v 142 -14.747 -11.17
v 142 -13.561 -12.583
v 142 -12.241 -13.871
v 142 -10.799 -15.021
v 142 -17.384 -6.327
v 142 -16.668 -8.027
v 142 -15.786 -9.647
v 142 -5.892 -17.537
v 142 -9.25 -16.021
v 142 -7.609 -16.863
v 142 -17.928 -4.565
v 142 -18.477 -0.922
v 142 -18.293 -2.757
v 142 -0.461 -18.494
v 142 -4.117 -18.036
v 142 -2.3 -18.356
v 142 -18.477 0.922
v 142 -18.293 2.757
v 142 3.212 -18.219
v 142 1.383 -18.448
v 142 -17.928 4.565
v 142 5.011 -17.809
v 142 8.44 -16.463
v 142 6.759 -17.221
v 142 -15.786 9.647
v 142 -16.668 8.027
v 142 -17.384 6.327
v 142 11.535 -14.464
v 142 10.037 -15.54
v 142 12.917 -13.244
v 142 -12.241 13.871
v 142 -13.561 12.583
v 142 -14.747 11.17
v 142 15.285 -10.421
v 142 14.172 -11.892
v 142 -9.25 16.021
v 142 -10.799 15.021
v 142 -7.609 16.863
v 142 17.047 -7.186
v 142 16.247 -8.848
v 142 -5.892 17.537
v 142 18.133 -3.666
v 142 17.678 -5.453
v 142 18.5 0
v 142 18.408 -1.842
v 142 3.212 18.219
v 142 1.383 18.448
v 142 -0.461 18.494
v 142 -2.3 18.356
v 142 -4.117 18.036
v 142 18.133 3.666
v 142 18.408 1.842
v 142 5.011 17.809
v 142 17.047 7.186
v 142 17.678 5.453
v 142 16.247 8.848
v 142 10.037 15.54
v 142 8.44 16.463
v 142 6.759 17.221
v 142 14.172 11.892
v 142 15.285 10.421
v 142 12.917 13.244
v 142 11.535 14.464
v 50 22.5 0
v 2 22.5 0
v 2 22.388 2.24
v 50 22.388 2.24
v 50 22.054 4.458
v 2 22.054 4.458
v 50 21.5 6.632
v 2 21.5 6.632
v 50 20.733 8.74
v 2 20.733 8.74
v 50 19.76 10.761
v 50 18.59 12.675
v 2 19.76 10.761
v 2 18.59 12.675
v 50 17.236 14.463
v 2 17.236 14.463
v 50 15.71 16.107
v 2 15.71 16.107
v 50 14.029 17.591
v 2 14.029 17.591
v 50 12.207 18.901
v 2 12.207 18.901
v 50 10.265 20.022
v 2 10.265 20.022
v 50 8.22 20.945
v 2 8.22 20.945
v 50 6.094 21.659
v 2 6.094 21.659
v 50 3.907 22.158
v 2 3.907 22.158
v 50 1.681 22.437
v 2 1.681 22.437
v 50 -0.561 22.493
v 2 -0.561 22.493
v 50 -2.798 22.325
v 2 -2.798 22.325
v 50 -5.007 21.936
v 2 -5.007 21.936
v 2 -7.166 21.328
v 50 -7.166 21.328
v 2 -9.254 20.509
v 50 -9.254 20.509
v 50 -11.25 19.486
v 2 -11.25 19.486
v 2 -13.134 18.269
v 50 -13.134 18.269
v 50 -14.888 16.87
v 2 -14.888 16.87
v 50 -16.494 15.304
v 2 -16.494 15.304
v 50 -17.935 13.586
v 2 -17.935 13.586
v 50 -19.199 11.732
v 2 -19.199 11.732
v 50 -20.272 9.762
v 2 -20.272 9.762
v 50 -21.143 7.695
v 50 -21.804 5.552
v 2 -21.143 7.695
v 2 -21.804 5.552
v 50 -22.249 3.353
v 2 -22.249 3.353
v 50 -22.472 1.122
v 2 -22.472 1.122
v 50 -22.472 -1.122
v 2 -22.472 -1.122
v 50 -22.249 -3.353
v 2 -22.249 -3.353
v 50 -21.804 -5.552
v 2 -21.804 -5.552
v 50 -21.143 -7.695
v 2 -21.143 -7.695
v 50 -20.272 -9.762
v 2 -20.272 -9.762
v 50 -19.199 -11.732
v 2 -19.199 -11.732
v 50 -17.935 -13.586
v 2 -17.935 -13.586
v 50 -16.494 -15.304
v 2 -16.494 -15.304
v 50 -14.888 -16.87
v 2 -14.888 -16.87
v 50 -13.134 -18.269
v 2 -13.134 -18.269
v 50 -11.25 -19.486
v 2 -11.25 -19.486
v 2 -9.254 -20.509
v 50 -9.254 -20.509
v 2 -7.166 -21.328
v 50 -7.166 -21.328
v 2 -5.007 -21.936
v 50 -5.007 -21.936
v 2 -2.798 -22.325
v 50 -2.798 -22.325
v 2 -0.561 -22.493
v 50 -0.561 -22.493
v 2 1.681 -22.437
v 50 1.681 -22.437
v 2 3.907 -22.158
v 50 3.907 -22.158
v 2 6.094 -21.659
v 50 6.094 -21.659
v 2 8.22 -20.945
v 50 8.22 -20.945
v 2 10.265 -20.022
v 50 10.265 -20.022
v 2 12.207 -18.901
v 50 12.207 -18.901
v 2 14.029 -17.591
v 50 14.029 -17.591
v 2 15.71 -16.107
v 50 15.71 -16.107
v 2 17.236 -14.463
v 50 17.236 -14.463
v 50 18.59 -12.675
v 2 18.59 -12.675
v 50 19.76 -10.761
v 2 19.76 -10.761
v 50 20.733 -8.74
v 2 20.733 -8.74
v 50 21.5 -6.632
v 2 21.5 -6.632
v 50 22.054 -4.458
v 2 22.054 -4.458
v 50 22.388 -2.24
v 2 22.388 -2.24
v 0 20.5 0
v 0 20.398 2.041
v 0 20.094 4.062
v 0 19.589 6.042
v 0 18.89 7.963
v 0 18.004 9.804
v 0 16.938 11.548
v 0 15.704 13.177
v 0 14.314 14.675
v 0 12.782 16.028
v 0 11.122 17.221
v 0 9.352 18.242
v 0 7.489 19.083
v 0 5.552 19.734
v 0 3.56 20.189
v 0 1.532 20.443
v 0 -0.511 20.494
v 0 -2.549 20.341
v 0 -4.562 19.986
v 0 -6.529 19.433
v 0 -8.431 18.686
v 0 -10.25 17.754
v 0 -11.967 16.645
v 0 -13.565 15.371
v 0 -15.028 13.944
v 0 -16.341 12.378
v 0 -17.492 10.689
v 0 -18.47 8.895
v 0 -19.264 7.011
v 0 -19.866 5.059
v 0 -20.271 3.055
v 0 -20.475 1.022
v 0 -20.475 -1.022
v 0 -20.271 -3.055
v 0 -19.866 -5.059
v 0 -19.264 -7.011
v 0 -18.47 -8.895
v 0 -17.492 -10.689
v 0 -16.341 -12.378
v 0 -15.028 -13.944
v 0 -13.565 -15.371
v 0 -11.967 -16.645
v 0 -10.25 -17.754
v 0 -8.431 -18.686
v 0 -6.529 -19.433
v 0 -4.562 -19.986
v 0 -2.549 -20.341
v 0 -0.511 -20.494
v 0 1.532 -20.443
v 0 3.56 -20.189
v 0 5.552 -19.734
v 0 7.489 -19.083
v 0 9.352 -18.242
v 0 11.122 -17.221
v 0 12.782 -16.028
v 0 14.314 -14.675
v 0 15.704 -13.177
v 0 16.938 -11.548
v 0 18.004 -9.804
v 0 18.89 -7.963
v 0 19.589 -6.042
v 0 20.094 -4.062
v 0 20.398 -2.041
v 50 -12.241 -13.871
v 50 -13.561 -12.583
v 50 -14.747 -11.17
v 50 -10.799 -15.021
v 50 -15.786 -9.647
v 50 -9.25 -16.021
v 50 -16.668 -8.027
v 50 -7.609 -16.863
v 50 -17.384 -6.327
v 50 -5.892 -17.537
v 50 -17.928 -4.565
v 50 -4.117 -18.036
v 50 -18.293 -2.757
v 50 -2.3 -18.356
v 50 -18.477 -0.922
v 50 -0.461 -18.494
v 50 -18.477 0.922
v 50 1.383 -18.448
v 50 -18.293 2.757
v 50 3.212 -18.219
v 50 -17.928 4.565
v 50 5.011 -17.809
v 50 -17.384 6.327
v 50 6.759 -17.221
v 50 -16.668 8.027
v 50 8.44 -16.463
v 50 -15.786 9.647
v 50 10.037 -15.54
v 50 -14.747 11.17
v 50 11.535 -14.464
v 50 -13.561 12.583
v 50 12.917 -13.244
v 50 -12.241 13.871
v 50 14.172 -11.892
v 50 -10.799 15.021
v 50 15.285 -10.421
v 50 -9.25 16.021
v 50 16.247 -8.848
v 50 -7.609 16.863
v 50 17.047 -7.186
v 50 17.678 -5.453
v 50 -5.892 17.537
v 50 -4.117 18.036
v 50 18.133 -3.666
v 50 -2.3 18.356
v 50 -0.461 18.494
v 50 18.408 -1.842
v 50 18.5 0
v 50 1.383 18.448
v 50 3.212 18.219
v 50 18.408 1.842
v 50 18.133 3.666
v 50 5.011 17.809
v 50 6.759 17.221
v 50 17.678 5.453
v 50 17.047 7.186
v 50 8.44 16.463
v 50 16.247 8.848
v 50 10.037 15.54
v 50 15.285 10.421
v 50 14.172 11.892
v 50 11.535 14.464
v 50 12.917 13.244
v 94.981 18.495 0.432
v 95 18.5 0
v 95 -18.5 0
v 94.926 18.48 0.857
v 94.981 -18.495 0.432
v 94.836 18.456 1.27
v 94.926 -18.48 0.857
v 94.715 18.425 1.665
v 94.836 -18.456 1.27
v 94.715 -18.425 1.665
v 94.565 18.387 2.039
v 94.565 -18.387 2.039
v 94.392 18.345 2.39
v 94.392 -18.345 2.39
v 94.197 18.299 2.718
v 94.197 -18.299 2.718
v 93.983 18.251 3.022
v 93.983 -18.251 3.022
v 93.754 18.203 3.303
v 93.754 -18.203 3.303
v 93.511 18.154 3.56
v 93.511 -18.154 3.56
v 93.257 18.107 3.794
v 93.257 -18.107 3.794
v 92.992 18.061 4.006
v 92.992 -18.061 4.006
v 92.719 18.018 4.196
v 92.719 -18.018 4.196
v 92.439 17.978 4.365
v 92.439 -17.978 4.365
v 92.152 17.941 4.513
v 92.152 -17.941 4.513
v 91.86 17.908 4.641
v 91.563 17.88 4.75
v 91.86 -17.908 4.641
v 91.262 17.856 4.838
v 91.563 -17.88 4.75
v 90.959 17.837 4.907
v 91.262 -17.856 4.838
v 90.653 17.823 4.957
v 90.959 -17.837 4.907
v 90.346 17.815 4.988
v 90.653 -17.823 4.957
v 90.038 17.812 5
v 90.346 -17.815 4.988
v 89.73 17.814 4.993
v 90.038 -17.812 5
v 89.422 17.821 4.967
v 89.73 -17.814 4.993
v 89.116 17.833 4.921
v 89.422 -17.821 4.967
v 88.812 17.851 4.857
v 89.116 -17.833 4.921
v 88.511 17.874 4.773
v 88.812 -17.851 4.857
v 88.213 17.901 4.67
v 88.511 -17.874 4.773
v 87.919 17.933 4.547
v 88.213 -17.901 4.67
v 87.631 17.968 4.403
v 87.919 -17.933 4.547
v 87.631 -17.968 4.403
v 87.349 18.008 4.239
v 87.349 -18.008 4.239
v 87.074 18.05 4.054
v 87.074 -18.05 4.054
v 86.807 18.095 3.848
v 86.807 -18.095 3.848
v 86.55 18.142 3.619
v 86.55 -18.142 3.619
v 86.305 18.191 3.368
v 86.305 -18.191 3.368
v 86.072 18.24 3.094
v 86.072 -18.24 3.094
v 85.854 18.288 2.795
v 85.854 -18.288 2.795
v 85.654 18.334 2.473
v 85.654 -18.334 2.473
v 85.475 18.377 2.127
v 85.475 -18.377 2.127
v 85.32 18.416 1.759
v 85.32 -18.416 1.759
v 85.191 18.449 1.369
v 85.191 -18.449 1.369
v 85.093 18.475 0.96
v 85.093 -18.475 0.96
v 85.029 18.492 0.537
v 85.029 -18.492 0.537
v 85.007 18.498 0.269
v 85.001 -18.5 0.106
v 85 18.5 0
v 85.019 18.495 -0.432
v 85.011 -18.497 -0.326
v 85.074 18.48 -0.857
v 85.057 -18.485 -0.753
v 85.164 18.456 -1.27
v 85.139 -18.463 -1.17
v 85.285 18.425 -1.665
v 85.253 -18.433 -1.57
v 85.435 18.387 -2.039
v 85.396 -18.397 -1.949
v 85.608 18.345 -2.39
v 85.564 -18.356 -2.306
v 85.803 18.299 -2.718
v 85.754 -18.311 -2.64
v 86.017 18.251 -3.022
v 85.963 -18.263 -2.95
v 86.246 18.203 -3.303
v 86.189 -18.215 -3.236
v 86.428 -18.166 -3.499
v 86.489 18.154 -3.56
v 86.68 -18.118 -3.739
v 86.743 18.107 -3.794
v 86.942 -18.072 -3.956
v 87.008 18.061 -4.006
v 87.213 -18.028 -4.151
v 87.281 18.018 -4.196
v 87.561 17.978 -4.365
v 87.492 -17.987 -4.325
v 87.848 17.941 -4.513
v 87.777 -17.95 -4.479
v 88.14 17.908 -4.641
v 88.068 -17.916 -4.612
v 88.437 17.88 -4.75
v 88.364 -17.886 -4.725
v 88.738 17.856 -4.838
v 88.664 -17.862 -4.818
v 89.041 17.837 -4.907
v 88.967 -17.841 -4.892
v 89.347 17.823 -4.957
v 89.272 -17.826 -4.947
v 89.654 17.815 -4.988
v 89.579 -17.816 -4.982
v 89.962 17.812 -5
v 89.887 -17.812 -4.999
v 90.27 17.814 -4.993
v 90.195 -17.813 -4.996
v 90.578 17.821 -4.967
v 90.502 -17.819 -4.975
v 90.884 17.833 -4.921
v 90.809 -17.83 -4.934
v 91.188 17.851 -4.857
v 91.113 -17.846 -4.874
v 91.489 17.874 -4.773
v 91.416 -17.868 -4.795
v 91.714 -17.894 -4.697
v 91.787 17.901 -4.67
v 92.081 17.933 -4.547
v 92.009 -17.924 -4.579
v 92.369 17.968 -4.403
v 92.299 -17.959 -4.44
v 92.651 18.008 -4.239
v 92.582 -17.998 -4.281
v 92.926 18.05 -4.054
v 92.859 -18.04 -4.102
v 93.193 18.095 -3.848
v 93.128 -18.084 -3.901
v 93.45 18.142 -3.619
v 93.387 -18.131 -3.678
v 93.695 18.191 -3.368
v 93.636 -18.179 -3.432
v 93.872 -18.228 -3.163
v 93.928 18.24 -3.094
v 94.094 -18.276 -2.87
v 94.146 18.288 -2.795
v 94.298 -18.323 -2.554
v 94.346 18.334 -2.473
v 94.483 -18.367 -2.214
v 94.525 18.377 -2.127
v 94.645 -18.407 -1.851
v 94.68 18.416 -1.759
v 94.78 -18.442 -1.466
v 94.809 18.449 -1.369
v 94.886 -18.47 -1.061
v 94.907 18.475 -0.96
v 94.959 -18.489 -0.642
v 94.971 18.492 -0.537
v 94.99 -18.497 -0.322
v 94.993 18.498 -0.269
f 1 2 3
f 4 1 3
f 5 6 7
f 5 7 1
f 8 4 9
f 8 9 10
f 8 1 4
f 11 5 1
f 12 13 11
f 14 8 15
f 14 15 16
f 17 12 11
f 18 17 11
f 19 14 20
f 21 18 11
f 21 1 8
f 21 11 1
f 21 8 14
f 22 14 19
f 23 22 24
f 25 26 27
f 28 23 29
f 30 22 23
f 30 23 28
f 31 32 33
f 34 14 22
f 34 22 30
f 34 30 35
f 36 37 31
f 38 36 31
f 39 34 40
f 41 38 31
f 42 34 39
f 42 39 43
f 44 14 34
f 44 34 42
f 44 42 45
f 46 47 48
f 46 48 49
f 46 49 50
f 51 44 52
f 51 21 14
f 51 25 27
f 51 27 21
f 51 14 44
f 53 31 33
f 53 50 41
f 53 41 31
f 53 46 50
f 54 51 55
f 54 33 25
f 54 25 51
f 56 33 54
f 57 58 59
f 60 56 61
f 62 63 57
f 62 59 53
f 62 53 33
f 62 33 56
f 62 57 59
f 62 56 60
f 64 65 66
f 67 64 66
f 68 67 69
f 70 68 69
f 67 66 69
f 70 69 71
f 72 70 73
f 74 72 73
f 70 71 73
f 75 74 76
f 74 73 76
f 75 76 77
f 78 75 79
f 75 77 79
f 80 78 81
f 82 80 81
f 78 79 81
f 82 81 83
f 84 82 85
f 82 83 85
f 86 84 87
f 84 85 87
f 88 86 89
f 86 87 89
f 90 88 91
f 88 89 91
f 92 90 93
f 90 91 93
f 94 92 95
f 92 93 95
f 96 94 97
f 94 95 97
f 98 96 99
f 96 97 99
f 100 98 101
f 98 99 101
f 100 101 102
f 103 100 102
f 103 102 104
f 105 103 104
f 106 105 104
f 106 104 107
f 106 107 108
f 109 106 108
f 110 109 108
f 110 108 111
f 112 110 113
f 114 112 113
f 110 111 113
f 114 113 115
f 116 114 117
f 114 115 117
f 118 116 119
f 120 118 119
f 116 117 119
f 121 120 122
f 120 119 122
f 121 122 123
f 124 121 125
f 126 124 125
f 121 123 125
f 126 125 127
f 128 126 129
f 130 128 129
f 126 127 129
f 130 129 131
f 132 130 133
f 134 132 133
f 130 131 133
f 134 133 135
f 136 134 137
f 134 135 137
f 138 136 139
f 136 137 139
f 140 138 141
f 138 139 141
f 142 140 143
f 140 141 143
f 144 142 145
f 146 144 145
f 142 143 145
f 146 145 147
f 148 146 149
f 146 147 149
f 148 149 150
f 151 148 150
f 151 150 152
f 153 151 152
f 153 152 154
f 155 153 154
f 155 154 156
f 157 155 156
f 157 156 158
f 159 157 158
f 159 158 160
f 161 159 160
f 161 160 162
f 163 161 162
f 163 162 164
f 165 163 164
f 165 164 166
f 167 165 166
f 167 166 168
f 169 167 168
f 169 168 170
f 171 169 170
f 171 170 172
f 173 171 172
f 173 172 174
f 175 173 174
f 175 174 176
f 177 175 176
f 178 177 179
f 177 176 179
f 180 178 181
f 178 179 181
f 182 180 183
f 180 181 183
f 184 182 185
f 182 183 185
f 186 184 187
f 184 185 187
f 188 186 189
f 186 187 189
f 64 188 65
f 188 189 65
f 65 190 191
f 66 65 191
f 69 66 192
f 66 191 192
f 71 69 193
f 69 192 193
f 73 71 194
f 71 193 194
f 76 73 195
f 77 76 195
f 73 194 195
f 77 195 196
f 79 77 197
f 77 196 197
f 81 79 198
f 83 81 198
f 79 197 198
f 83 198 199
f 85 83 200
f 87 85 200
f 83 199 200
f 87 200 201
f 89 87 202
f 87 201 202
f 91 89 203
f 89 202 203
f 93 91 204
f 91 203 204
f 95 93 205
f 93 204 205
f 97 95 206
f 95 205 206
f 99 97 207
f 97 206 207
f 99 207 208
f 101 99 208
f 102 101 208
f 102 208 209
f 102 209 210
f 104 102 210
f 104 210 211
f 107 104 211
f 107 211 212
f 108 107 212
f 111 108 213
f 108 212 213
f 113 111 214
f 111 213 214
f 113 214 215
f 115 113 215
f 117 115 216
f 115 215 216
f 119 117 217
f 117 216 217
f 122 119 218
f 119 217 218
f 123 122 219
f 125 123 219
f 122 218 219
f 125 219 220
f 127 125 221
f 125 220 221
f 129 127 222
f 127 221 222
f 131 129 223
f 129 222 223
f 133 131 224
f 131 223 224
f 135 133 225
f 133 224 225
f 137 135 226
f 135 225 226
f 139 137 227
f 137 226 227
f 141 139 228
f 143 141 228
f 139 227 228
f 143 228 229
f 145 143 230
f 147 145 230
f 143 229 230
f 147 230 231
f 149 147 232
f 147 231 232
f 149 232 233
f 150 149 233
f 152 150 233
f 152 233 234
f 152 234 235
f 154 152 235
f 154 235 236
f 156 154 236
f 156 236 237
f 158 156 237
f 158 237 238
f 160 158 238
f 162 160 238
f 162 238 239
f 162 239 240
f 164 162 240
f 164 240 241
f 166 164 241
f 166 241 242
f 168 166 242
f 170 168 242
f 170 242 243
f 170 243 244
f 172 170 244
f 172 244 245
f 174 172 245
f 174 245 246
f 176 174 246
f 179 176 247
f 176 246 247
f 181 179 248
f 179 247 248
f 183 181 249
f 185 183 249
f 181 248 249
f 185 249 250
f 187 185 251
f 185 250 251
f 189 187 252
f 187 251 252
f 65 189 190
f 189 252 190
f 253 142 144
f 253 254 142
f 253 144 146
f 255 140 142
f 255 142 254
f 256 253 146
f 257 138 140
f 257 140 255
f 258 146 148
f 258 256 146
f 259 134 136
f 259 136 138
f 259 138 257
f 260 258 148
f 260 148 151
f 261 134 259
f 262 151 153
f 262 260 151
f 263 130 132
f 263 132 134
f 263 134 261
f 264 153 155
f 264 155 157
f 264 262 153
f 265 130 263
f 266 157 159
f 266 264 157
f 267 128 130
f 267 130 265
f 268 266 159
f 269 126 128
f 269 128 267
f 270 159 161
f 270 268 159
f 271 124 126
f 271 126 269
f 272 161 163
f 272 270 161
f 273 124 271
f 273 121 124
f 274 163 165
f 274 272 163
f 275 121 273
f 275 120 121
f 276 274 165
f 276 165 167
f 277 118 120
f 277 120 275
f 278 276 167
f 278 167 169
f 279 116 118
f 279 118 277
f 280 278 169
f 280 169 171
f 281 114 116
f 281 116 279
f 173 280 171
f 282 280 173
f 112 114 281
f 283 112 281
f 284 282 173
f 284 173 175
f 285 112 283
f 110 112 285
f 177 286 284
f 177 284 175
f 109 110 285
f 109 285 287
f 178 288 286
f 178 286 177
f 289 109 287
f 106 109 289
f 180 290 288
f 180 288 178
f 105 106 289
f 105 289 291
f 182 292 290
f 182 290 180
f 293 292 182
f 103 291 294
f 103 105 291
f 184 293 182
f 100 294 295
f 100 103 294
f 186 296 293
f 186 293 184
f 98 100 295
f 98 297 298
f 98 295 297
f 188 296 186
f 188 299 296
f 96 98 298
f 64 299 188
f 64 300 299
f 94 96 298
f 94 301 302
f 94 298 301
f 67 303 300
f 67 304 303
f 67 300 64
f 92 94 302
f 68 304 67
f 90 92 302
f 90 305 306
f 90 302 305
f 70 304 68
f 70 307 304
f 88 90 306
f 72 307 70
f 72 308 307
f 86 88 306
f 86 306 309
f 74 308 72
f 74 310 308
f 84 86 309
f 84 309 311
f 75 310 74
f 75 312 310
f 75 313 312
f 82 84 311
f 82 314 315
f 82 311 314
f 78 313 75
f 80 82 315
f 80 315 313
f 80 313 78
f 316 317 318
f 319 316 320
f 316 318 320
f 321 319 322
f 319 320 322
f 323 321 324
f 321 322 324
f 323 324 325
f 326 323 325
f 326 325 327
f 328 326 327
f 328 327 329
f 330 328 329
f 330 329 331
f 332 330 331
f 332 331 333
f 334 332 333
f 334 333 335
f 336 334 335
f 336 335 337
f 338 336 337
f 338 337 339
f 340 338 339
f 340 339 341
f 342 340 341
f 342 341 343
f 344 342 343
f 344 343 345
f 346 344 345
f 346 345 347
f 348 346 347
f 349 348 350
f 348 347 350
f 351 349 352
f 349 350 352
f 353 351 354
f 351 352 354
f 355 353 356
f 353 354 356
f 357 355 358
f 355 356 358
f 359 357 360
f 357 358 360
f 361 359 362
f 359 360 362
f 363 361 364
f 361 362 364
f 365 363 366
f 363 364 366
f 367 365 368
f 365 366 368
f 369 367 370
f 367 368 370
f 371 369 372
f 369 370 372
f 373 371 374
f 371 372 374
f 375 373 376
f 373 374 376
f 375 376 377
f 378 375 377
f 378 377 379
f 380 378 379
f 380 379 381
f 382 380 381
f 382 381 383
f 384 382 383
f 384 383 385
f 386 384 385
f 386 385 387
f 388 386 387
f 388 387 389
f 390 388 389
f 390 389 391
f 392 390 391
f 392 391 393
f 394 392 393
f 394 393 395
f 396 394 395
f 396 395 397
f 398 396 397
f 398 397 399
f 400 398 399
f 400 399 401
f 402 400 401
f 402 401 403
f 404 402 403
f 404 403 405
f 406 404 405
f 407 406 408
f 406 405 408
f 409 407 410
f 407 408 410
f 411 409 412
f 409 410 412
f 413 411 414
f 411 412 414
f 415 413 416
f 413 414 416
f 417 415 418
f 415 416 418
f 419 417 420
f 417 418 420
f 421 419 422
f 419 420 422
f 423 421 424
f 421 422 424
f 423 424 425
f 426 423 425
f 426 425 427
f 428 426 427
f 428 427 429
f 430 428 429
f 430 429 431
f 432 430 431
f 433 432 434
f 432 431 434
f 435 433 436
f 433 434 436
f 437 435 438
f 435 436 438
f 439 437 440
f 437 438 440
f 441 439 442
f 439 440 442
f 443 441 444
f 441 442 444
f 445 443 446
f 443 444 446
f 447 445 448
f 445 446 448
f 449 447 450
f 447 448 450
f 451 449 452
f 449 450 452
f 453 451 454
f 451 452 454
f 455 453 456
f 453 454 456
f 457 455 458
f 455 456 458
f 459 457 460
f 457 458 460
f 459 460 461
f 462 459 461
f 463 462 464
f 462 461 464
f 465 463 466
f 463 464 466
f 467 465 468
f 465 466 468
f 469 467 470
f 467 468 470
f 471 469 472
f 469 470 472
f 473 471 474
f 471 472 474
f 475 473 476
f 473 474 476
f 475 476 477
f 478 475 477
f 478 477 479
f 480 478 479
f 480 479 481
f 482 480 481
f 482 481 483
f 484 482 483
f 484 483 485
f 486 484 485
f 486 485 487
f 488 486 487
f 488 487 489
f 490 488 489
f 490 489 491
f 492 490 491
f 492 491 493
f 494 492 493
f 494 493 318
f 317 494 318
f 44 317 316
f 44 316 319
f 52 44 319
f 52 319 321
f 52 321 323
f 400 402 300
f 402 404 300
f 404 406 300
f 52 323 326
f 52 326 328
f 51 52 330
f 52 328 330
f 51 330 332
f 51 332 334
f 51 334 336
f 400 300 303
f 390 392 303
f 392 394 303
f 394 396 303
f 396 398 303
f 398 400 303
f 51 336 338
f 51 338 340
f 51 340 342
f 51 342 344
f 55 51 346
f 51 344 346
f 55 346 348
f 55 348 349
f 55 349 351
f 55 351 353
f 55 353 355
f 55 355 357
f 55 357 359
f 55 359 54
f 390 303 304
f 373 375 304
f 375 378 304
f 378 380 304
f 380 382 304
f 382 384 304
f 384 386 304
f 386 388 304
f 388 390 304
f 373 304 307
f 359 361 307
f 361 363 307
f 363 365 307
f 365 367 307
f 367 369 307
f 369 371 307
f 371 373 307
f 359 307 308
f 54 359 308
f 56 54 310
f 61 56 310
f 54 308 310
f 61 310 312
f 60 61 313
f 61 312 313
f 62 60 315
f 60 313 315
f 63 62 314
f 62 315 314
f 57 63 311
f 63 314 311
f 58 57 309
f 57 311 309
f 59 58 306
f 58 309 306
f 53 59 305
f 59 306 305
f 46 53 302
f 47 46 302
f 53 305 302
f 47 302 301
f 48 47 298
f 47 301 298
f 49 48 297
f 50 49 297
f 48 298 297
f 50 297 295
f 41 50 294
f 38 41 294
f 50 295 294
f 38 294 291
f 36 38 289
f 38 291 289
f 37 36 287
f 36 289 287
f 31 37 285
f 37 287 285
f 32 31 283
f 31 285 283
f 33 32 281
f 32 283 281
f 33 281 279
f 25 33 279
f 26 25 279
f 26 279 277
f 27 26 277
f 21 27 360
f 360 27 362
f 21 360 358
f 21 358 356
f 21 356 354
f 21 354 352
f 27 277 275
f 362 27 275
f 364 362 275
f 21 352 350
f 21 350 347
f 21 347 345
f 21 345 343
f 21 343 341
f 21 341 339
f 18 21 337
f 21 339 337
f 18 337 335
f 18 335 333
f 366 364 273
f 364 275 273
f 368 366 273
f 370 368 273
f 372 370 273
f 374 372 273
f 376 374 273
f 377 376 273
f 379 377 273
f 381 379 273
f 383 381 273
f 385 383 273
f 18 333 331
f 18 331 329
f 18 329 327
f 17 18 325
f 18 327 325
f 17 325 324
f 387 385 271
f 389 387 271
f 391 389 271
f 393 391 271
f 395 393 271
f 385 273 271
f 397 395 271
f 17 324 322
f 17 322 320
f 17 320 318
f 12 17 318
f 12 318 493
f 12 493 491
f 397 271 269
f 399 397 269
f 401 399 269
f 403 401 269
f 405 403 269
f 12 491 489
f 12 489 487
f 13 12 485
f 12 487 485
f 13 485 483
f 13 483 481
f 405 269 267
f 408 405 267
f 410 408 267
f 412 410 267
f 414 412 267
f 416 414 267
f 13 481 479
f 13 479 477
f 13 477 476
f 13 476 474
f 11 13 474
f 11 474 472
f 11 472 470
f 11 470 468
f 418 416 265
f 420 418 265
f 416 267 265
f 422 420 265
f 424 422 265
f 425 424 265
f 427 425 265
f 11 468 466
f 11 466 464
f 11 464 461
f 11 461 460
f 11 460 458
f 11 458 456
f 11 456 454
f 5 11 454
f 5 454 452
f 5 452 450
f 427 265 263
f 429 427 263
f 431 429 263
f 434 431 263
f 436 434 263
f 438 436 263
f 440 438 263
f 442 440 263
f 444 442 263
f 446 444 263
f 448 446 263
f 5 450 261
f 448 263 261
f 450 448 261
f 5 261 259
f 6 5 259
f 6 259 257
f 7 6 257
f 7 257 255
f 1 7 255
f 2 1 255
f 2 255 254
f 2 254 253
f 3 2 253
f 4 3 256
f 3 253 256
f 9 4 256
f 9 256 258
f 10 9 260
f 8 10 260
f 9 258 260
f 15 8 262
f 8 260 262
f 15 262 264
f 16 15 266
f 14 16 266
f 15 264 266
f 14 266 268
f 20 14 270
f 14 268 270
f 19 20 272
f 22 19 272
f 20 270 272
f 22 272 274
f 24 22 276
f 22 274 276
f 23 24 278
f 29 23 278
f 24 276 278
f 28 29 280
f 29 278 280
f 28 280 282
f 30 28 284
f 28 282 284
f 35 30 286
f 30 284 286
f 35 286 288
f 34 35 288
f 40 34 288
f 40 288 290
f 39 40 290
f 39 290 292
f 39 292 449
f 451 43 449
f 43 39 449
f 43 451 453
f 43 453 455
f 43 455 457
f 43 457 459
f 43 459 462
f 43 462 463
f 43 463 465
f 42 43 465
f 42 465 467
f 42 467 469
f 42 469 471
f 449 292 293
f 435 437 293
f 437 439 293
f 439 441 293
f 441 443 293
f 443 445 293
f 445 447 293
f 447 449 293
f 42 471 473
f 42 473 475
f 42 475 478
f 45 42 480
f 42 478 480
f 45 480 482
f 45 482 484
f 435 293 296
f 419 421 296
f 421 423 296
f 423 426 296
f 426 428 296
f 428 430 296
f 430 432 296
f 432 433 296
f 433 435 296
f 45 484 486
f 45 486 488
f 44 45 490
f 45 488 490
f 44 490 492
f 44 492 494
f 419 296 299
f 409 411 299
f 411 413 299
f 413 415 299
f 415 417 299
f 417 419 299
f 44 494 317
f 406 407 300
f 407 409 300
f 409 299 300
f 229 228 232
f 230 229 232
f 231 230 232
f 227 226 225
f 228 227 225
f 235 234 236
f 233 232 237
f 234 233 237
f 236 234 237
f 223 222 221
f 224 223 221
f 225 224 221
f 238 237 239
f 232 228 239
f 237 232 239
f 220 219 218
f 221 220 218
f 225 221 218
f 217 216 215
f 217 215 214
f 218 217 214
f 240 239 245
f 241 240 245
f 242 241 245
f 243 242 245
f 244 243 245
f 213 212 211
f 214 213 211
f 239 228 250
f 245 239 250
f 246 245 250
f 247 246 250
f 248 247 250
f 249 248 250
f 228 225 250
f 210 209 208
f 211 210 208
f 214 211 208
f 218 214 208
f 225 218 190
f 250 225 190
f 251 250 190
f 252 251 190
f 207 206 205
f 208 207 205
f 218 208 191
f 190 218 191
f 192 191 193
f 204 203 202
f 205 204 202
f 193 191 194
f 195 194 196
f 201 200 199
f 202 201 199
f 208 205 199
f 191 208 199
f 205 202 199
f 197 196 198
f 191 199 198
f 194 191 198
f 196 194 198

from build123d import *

# Parameters (mm, degrees)
F0_R     = 18.5
F1_DEPTH = 142
F0_R_2   = 22.5
F2_DEPTH = 50
F3_R     = 5
F4_DEPTH = 25
F5_SIZE  = 2


with BuildPart() as f1:
    # F0 (on Right) → F1 (new body)
    with BuildSketch(Plane.YZ):
        Circle(F0_R)
    extrude(amount=F1_DEPTH)

    # F0 (on Right) → F2 (join)
    with BuildSketch(Plane.YZ):
        Circle(F0_R_2)
        Circle(F0_R, mode=Mode.SUBTRACT)
    extrude(amount=F2_DEPTH)

    # F3 (on Front) → F4 (cut, symmetric)
    with BuildSketch(Plane.XZ):
        with Locations((90, 0)):
            Circle(F3_R)
    extrude(amount=F4_DEPTH, both=True, mode=Mode.SUBTRACT)

    # F5
    f5_edges = [f1.edges().sort_by_distance(p)[0] for p in [
        (0, -22.5, 0),
    ]]
    chamfer(f5_edges, length=F5_SIZE)


solid = f1.part
